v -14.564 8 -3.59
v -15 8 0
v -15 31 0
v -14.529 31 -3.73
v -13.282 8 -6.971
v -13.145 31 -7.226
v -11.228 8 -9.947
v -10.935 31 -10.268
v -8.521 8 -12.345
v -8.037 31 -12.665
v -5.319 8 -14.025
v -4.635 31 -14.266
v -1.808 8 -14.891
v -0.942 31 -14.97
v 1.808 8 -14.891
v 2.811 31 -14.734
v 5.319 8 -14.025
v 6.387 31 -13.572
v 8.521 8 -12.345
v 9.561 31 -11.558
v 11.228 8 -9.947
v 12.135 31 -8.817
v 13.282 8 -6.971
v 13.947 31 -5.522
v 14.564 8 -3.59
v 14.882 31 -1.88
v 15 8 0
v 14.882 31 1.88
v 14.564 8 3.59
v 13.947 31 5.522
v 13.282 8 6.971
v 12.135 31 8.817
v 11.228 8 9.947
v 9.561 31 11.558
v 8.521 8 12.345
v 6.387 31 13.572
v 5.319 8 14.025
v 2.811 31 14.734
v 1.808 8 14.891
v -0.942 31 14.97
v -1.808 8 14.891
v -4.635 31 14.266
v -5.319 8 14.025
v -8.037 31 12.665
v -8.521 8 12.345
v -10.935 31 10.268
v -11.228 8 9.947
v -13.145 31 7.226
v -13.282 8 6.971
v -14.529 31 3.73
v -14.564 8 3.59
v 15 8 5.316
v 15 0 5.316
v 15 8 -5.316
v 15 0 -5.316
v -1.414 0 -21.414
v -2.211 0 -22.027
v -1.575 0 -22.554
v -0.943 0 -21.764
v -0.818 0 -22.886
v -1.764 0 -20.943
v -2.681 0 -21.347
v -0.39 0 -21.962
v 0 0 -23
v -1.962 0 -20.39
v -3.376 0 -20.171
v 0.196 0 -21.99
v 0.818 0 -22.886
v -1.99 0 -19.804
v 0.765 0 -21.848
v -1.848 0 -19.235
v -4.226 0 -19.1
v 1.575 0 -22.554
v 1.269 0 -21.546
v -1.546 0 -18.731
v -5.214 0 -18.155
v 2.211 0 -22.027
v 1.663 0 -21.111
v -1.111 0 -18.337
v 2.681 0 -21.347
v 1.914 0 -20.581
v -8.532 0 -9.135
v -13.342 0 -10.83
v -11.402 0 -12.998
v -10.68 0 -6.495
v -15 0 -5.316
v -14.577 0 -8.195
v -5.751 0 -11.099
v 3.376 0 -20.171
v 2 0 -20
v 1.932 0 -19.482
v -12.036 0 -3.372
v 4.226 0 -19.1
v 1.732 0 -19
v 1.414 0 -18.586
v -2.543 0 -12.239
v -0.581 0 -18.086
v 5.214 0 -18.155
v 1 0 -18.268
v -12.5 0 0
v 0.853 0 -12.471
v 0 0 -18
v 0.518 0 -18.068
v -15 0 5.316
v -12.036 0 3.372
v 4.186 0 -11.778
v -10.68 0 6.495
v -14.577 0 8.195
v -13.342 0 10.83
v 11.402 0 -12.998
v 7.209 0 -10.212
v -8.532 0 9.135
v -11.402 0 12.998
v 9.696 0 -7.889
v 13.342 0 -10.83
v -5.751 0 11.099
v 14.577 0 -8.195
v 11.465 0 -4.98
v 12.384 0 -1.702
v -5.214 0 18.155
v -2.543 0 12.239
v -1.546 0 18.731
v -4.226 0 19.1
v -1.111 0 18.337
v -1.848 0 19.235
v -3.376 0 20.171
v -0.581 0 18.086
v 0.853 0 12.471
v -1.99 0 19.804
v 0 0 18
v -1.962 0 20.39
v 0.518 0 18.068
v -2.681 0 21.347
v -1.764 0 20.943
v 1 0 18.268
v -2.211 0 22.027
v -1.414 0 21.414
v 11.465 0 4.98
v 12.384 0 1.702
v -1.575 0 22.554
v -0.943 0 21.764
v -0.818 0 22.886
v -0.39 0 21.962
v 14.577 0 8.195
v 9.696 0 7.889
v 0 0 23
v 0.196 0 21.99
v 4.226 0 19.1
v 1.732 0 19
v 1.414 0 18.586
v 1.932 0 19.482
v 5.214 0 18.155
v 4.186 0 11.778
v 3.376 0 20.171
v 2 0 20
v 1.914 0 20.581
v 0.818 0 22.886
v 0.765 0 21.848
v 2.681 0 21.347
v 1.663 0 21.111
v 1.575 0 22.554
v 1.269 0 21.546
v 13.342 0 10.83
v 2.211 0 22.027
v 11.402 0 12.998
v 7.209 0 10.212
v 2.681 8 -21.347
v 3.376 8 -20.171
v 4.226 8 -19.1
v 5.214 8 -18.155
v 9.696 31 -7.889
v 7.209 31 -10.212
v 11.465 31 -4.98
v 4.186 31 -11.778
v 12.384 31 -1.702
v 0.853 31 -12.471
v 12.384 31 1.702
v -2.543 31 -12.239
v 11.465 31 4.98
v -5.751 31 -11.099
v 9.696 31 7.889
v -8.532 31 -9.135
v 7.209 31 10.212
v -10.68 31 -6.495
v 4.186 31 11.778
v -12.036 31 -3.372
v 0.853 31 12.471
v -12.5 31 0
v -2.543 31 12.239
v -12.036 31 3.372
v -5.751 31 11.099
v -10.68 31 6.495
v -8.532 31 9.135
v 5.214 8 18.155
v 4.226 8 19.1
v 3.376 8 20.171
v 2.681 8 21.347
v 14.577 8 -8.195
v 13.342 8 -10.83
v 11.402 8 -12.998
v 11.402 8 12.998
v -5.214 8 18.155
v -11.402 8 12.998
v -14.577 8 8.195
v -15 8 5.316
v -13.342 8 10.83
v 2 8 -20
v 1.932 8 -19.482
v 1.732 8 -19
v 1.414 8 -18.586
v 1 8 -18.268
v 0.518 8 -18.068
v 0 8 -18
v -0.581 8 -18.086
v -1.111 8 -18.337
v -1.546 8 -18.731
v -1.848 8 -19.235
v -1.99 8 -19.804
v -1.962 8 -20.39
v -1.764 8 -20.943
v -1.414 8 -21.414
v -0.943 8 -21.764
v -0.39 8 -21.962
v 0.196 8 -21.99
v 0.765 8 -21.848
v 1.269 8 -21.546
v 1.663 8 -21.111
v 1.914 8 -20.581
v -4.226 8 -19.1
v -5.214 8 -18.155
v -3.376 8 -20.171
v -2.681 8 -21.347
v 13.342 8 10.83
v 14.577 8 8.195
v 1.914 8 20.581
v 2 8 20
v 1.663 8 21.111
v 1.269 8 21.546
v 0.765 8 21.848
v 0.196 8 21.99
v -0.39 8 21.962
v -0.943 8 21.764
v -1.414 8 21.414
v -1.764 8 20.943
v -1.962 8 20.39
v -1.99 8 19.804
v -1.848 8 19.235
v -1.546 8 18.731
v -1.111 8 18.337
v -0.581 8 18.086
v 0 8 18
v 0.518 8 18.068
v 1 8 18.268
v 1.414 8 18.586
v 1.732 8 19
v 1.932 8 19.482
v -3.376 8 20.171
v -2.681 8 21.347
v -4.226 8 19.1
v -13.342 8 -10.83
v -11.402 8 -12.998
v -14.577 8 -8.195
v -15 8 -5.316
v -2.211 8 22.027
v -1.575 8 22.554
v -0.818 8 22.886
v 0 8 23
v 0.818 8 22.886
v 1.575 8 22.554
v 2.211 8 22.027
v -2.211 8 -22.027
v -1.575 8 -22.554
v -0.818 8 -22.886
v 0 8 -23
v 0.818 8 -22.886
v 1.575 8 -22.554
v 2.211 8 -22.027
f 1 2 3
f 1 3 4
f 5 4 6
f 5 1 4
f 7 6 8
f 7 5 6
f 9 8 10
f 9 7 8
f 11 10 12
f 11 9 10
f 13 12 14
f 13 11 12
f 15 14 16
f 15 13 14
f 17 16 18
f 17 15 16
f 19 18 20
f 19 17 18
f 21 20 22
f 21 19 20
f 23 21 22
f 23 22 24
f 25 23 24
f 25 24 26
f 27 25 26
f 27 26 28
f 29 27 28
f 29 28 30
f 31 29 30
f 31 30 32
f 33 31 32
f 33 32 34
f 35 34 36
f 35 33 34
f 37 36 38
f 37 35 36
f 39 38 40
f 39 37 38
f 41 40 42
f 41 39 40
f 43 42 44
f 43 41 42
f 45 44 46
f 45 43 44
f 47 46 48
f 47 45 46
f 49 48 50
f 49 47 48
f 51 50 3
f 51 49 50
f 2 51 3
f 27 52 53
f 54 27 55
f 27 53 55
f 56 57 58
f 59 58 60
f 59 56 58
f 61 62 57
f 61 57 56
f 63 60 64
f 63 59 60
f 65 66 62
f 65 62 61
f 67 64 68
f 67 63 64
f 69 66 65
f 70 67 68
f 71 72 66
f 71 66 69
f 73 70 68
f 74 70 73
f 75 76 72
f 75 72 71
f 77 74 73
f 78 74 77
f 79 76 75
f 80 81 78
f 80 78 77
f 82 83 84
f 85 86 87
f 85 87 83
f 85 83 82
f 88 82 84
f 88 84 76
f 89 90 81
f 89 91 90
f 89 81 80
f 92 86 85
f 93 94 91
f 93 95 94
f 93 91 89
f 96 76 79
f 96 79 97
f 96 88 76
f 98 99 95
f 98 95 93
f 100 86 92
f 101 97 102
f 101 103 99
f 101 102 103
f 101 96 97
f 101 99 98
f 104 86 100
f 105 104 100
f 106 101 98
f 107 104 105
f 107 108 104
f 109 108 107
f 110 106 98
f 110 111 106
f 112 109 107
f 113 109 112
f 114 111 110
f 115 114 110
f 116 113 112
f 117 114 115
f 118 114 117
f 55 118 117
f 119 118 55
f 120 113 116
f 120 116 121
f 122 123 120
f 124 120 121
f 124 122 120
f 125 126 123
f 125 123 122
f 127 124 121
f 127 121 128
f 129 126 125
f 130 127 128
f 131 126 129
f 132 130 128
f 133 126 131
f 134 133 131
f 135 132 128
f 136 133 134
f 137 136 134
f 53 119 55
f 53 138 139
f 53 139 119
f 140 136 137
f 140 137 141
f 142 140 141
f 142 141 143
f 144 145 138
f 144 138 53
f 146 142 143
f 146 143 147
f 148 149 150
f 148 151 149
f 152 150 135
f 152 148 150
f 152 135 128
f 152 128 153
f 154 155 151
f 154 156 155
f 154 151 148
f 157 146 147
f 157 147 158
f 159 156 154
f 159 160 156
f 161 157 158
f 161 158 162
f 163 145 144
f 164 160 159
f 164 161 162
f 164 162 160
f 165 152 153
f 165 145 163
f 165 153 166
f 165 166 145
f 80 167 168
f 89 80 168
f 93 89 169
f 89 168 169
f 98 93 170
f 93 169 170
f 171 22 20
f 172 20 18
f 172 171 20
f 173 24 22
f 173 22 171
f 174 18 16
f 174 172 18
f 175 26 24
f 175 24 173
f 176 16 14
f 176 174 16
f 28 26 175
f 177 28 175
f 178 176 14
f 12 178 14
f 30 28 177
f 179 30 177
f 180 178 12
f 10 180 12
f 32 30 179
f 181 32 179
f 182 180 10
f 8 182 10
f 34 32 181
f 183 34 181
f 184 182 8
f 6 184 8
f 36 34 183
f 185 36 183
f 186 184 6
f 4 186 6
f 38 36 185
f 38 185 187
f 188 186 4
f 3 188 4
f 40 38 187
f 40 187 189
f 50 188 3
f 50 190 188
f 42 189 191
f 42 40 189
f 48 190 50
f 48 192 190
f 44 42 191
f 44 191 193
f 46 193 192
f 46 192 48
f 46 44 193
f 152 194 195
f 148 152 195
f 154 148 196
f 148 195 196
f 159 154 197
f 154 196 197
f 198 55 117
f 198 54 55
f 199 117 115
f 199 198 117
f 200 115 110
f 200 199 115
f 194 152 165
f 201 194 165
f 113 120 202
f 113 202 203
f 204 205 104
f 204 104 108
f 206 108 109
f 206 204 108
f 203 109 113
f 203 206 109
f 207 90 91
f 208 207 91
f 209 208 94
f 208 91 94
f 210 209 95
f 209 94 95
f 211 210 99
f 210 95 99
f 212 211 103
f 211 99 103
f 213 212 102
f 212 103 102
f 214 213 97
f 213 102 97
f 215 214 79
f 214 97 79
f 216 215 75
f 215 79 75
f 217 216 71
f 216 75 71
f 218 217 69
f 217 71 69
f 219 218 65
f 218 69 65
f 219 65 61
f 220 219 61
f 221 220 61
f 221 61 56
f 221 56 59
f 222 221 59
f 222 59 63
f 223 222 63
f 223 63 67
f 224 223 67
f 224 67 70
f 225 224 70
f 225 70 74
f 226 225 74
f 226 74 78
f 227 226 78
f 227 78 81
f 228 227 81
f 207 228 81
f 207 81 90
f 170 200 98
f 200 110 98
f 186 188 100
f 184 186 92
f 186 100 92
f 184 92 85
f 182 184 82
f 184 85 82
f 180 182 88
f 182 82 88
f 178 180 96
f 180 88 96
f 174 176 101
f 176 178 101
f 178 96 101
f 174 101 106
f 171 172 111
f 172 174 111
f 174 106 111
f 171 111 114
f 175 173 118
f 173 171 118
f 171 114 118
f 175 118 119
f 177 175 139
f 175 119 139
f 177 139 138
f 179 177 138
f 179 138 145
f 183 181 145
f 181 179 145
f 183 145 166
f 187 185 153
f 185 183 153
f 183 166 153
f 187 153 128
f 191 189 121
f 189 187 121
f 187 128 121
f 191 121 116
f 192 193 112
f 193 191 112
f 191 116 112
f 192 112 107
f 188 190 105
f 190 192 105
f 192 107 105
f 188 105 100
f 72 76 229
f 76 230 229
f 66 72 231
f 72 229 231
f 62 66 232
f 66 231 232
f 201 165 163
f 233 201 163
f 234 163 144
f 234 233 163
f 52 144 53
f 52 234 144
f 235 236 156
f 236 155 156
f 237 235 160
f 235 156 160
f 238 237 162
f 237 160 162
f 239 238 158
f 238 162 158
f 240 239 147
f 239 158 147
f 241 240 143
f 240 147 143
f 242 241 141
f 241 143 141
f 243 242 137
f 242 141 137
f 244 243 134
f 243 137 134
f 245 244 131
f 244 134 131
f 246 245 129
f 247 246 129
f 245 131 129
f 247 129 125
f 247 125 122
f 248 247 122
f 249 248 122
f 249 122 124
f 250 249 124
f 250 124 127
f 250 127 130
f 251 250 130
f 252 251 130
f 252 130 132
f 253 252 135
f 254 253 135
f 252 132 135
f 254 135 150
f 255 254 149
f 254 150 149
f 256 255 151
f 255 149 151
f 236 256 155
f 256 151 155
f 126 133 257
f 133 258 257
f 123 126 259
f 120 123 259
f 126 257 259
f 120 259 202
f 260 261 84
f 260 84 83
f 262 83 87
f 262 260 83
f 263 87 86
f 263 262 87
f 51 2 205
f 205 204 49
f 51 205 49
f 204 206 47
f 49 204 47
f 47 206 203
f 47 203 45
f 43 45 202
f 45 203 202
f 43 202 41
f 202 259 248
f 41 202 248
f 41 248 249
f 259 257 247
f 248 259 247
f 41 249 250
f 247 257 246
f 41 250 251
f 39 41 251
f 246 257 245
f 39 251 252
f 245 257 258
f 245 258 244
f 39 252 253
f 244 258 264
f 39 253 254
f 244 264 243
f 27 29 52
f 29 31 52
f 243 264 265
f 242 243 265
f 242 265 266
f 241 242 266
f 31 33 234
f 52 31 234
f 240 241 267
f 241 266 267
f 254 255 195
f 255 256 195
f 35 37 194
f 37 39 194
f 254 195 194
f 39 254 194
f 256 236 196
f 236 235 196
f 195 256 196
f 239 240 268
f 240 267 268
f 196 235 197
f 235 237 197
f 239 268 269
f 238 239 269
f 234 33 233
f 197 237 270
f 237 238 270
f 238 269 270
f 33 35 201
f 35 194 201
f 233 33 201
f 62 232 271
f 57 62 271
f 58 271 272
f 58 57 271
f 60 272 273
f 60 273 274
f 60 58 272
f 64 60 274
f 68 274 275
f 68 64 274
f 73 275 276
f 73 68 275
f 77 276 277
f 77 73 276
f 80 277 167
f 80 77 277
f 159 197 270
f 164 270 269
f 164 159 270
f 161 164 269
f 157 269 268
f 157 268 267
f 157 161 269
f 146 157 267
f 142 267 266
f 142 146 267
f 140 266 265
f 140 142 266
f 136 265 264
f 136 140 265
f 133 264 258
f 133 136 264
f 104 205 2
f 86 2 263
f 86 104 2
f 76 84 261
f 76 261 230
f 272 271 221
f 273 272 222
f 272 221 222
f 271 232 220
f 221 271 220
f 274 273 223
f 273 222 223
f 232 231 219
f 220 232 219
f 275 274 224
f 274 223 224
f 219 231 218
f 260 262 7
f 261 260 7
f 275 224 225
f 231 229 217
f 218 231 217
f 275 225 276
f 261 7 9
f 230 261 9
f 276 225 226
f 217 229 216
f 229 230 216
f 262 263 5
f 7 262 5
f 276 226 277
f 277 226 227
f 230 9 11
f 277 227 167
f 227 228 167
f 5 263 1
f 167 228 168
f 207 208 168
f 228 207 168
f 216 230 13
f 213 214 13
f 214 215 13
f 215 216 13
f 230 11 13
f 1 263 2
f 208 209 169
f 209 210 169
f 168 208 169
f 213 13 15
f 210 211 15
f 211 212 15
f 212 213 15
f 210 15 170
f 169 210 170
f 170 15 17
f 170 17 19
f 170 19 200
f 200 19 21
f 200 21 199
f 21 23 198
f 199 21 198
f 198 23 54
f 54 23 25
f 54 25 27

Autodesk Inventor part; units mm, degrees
ref_plane "YZ Plane" through (0, 0, 0) normal (1, 0, 0) x (0, 1, 0)
ref_plane "XZ Plane" through (0, 0, 0) normal (0, 1, 0) x (-1, 0, 0)
ref_plane "XY Plane" through (0, 0, 0) normal (0, 0, 1) x (1, 0, 0)
sketch "Эскиз1" plane through (0, 0, 0) normal (0, 1, 0) x (-1, 0, 0)
  circle A0 centre (0, 0) radius 12.5
  circle A1 centre (0, 0) radius 15
  dimension "d0" = 25
  dimension "d1" = 30
extrude "Выдавливание1" add sketch "Эскиз1" along normal blind 31
sketch "Эскиз2" plane through (0, 0, 0) normal (0, -1, 0) x (1, 0, 0)
  line L0 (0, 20) -> (0, -20)
  circle A0 centre (0, 20) radius 2
  circle A1 centre (0, -20) radius 2
  circle A2 centre (0, 20) radius 3
  circle A3 centre (0, -20) radius 3
  line L1 (15, 10) -> (15, -10)
  circle A4 centre (0, 0) radius 15 projected
  line L2 (-15, 10) -> (-15, -10)
  line L3 (3, 20) -> (15, 10)
  line L4 (15, -10) -> (3, -20)
  line L5 (-15, -10) -> (-3, -20)
  line L6 (-3, 20) -> (-15, 10)
  point P0 (15, 0)
  point P1 (-15, 0)
  dimension "d4" = 40
  dimension "d5" = 4
  dimension "d6" = 4
  dimension "d7" = 6
  dimension "d8" = 6
  dimension "d9" = 20
  dimension "d10" = 20
  dimension "d11" = 10
  dimension "d12" = 10
extrude "Выдавливание2" add sketch "Эскиз2" against normal blind 8 contours A2 | A2 L3 L1 A4 L0 | L0 A4 L2 L6 A2 | A4 L1 L4 A3 L0 | L0 A3 L5 L2 A4 | A3
fillet "Сопряжение1" radius 10 4 edges at (-15, 4, 10) (-15, 4, -10) (15, 4, 10) (15, 4, -10)
fillet "Сопряжение2" radius 10 4 edges at (3, 4, 20) (-3, 4, 20) (3, 4, -20) (-3, 4, -20)
properties part number "conder"
